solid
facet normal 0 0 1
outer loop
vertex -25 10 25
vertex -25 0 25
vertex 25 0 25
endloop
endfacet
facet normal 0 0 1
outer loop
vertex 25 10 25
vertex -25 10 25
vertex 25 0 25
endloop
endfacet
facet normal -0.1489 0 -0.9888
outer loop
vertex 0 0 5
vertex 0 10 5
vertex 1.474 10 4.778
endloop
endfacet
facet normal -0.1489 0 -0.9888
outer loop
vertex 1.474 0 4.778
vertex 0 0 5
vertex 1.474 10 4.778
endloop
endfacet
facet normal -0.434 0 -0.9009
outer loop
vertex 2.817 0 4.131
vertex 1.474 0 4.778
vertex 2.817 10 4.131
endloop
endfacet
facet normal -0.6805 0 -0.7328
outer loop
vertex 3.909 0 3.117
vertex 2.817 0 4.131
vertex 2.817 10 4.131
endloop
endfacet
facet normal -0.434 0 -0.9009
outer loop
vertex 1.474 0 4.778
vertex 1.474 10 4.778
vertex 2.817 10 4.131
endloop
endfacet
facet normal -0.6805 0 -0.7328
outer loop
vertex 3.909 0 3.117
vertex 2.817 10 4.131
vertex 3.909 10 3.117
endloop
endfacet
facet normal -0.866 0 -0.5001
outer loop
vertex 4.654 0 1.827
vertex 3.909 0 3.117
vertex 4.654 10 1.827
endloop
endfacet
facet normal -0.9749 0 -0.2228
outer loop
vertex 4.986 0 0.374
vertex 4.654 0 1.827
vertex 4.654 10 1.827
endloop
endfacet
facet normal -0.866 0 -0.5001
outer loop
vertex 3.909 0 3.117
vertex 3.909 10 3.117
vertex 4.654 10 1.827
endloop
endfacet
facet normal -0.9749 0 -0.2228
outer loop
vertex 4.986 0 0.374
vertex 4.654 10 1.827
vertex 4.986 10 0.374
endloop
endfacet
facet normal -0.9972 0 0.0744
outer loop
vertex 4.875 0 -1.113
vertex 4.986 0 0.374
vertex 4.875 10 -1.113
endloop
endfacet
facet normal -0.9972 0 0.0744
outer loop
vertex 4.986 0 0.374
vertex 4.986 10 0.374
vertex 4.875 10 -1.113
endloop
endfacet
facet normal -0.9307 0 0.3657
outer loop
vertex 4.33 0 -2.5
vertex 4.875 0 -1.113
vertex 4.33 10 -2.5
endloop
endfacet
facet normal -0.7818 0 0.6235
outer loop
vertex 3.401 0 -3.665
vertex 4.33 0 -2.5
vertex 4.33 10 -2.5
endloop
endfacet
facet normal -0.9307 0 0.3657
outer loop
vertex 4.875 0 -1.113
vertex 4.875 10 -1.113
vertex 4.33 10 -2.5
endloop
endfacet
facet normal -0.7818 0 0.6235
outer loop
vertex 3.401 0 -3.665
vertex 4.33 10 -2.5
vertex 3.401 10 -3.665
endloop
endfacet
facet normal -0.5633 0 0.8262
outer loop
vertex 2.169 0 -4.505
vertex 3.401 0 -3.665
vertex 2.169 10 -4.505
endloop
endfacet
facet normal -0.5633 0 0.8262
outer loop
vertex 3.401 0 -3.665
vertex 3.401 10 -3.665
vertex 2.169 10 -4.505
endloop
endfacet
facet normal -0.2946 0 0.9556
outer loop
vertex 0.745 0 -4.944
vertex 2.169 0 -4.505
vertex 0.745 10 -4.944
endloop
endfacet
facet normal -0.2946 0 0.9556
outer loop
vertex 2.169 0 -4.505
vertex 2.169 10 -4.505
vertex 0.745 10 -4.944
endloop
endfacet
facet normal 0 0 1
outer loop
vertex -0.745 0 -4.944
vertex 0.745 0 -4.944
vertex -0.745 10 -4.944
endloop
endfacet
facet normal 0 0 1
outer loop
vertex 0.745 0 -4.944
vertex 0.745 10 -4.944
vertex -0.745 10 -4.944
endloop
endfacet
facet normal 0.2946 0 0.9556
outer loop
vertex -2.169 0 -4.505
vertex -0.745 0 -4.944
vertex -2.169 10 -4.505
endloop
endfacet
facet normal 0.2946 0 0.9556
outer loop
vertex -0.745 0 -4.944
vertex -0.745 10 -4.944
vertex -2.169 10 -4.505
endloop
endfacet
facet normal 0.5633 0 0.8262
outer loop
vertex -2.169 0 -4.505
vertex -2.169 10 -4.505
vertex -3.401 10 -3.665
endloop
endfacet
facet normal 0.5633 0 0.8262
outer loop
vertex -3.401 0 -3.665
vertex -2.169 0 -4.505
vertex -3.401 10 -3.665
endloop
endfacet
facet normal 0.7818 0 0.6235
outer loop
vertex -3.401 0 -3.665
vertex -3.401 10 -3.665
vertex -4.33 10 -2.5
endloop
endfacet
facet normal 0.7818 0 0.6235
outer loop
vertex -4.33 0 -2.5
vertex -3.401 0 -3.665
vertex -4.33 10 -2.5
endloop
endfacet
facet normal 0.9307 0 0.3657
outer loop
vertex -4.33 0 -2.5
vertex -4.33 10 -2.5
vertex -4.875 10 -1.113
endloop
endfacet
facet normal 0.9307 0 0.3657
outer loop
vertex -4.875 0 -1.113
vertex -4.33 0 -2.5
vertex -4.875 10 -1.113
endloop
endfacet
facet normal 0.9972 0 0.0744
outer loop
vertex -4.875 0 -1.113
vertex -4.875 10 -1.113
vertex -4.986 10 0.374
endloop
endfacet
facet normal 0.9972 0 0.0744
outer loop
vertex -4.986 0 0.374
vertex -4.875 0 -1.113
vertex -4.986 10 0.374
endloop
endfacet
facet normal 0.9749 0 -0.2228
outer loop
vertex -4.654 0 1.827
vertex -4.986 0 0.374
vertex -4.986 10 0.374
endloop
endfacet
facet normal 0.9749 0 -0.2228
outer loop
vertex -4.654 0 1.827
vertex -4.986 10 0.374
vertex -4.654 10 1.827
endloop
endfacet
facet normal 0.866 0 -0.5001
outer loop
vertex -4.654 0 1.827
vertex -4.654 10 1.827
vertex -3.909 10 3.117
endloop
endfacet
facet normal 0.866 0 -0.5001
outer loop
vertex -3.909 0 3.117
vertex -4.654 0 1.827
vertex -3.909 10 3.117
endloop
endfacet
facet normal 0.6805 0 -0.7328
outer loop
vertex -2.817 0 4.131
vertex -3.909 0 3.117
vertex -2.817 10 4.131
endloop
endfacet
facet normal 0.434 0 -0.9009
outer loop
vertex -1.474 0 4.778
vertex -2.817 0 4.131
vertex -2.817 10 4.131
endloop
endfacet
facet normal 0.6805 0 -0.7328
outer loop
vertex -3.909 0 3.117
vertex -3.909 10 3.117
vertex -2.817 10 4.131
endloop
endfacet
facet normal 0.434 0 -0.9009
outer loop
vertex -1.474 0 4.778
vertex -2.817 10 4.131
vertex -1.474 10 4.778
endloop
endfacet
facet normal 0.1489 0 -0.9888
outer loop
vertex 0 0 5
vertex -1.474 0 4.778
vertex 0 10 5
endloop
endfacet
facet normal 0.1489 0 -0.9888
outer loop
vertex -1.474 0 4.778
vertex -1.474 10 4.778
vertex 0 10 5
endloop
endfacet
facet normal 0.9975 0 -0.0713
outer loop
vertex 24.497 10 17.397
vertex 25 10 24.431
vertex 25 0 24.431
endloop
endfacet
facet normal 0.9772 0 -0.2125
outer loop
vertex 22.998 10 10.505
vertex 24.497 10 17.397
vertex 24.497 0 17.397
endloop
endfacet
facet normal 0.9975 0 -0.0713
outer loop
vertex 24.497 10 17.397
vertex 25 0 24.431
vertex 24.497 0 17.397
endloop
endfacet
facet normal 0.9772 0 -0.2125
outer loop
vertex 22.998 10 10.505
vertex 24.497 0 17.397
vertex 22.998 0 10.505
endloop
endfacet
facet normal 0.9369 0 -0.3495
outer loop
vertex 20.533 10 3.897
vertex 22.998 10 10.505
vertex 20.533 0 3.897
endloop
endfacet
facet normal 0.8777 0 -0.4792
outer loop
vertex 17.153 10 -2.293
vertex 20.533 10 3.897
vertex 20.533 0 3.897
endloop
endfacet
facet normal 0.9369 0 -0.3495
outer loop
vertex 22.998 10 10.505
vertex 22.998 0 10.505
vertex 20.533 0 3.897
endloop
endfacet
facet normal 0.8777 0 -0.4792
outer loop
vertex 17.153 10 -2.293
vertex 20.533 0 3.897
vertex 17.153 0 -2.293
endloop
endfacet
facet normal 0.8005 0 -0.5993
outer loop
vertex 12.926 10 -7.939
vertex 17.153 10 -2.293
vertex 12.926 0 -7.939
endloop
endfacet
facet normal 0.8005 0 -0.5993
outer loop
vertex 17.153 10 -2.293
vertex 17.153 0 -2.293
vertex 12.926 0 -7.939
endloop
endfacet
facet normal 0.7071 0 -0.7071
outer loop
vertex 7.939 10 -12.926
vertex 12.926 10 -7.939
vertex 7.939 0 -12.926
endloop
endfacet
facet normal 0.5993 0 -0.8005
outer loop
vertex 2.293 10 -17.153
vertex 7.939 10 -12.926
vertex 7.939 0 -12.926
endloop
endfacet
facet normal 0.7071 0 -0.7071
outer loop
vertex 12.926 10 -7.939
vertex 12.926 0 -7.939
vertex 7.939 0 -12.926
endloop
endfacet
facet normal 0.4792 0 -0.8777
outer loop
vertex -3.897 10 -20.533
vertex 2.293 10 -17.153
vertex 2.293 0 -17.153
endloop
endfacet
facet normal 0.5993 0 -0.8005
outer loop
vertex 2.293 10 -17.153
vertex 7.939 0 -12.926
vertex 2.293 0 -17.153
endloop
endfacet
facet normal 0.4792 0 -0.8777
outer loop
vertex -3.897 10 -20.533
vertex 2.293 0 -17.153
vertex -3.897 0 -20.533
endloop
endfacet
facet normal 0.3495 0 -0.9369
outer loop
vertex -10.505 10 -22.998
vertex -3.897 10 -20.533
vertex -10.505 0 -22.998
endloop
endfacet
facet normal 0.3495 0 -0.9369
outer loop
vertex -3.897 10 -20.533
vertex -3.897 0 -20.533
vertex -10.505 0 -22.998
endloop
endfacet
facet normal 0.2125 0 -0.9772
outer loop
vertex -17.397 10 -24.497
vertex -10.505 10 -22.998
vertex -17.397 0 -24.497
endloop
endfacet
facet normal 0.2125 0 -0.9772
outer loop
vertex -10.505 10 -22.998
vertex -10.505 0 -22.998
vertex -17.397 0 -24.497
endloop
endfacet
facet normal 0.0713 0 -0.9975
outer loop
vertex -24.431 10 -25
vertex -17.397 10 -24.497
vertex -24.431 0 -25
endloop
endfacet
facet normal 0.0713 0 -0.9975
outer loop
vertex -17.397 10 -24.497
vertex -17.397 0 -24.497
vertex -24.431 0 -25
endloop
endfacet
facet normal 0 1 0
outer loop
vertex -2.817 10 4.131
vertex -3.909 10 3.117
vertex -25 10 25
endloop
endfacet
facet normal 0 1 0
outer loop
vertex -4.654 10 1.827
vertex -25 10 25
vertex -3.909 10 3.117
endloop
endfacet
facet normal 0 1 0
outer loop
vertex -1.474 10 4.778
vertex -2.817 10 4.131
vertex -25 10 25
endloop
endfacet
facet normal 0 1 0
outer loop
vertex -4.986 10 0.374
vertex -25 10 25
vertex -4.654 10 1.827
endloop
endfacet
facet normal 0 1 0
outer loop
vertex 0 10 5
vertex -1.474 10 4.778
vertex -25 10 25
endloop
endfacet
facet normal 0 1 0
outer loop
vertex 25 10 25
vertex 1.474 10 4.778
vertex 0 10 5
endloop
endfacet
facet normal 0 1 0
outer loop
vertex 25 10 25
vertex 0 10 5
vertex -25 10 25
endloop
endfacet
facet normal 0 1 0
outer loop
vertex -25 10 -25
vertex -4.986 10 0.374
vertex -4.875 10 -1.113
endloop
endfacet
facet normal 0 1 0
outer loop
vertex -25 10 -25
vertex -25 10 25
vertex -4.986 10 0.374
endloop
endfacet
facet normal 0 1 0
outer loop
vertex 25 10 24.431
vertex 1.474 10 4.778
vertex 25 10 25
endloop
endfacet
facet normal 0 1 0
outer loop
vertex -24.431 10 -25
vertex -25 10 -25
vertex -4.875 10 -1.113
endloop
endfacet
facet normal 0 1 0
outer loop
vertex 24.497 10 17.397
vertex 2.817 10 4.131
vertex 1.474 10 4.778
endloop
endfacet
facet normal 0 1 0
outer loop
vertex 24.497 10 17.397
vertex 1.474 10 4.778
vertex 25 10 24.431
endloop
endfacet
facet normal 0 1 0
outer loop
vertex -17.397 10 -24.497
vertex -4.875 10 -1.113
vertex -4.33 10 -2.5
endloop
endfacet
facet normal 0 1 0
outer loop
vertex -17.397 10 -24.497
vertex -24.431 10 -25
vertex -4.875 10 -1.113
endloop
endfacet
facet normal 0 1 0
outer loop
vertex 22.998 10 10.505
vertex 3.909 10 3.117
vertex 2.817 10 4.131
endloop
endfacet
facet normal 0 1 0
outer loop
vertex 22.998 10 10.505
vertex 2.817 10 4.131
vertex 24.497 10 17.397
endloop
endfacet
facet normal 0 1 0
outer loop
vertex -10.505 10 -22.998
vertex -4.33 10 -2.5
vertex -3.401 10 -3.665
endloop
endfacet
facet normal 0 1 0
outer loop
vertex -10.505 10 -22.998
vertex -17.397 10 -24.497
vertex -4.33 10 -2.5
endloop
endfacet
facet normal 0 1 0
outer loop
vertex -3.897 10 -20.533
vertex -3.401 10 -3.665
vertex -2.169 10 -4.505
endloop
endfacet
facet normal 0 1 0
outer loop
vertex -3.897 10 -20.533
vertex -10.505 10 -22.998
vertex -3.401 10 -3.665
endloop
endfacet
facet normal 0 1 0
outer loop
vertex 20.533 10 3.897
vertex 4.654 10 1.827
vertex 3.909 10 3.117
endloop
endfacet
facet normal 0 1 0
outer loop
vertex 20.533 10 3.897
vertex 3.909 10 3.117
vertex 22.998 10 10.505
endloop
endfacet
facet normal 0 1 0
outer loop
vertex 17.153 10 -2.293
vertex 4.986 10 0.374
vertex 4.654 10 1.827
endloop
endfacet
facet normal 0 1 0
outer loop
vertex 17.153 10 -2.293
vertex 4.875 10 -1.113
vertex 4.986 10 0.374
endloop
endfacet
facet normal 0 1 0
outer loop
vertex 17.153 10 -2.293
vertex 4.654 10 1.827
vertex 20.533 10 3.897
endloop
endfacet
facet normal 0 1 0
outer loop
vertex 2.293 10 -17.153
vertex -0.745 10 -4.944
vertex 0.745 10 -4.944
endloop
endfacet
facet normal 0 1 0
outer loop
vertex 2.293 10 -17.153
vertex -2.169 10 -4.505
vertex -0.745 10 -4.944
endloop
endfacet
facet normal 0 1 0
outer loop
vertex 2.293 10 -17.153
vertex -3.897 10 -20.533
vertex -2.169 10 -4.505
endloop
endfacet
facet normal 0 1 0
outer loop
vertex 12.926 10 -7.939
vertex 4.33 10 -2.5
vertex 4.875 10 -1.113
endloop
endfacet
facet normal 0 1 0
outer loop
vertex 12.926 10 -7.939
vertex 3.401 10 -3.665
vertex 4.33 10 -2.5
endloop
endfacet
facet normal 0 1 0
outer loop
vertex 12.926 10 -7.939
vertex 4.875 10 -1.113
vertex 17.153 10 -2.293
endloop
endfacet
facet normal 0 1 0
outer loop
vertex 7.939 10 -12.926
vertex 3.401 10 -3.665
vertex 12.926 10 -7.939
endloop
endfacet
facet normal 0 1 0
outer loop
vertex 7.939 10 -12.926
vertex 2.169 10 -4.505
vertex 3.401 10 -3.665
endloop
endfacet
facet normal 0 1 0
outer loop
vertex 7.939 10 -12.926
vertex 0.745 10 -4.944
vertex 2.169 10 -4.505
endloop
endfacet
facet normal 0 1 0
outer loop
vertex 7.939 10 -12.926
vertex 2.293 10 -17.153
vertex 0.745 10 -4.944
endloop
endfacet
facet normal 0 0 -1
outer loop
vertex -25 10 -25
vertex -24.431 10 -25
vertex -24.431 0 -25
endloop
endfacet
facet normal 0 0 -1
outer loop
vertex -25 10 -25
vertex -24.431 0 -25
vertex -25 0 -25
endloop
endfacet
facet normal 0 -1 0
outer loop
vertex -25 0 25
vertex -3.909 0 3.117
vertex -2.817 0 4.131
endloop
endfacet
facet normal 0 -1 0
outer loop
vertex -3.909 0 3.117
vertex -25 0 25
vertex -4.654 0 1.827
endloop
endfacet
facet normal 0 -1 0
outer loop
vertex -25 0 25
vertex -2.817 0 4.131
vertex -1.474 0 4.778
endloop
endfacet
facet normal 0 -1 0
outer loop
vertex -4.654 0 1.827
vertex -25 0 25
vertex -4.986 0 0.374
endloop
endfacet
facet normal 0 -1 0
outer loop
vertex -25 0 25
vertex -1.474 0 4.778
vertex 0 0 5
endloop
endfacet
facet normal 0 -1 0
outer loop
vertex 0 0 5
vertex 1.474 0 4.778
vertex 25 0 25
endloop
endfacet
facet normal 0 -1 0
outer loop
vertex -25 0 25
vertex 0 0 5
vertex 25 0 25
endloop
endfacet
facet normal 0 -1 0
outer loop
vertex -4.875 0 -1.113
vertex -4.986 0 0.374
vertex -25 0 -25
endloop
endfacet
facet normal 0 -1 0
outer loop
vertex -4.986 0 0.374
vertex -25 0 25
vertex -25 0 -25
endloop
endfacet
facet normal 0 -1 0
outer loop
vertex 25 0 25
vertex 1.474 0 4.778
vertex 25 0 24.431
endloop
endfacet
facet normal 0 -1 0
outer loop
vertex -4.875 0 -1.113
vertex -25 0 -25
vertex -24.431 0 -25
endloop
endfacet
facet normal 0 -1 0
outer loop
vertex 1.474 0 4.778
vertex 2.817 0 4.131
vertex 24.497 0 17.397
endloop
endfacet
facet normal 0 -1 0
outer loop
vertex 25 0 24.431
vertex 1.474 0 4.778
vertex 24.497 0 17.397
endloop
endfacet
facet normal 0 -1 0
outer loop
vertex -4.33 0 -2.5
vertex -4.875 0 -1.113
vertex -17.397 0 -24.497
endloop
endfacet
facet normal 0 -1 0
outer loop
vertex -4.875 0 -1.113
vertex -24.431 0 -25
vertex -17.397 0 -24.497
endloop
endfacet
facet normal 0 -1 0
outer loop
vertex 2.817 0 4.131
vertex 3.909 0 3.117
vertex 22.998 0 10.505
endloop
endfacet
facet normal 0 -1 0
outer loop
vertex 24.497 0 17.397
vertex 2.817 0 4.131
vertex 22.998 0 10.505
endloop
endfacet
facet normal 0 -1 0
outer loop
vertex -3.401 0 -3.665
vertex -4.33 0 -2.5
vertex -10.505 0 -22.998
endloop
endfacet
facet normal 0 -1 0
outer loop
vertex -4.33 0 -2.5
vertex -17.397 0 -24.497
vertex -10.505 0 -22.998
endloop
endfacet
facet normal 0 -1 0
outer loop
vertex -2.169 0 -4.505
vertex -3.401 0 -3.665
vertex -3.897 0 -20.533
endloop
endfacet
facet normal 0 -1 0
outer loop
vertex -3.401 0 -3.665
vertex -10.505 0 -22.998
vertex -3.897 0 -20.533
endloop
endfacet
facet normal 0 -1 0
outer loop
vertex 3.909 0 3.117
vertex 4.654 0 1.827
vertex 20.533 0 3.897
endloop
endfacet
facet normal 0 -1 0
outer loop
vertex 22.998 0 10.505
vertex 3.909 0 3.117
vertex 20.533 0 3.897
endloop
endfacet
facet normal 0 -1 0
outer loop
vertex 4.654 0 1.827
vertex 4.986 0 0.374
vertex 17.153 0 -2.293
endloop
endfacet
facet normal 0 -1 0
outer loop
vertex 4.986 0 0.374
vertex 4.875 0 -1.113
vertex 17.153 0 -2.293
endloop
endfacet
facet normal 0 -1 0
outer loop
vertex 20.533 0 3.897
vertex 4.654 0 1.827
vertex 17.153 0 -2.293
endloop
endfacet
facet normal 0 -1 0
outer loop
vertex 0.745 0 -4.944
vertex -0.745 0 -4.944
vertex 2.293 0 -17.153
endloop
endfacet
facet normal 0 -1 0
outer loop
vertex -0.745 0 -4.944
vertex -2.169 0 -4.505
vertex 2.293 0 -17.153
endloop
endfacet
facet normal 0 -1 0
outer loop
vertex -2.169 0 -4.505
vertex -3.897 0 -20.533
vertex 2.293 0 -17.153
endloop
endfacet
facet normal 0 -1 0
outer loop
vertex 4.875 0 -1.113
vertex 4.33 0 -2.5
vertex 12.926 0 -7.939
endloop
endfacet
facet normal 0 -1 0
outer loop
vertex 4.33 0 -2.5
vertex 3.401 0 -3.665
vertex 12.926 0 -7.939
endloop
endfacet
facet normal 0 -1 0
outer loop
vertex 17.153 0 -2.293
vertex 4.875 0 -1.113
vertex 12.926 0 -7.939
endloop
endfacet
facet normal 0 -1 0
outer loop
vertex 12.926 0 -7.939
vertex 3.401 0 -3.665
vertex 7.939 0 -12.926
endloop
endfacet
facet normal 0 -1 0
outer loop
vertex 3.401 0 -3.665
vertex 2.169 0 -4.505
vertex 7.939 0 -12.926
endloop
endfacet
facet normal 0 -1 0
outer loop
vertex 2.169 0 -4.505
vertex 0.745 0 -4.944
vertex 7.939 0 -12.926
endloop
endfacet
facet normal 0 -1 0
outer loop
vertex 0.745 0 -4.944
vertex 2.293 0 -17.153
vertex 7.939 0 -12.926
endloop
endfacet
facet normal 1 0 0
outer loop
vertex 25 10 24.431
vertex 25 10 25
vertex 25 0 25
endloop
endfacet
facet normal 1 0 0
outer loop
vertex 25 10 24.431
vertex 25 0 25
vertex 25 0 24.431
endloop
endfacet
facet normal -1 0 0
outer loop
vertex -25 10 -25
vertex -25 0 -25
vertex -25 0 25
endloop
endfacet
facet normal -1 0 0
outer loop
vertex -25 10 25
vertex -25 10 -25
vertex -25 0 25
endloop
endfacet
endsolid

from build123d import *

# Parameters (mm, degrees)
SALIENTE_EXTRUIR1_DEPTH = 10
CROQUIS2_R              = 5
CORTAR_EXTRUIR1_DEPTH   = 10


with BuildPart() as part:
    # Croquis1 → Saliente-Extruir1 (new body)
    with BuildSketch(Plane(origin=(0, 0, 0), x_dir=(1, 0, 0), z_dir=(0, 1, 0))):
        with BuildLine():
            Line((-25, -25), (25, -25))
            Line((25, -25), (25, -24.43130904))
            ThreePointArc((25, -24.43130904), (10.521904785, 10.521904785), (-24.43130904, 25))
            Line((-24.43130904, 25), (-25, 25))
            Line((-25, 25), (-25, -25))
        make_face()
    extrude(amount=SALIENTE_EXTRUIR1_DEPTH)

    # Croquis2 → Cortar-Extruir1 (cut)
    with BuildSketch(Plane(origin=(0, 10, 0), x_dir=(1, 0, 0), z_dir=(0, 1, 0))):
        with Locations(Location((0, 0, 0), (0, 0, 270))):
            Circle(CROQUIS2_R)
    extrude(amount=-CORTAR_EXTRUIR1_DEPTH, mode=Mode.SUBTRACT)


solid = part.part
